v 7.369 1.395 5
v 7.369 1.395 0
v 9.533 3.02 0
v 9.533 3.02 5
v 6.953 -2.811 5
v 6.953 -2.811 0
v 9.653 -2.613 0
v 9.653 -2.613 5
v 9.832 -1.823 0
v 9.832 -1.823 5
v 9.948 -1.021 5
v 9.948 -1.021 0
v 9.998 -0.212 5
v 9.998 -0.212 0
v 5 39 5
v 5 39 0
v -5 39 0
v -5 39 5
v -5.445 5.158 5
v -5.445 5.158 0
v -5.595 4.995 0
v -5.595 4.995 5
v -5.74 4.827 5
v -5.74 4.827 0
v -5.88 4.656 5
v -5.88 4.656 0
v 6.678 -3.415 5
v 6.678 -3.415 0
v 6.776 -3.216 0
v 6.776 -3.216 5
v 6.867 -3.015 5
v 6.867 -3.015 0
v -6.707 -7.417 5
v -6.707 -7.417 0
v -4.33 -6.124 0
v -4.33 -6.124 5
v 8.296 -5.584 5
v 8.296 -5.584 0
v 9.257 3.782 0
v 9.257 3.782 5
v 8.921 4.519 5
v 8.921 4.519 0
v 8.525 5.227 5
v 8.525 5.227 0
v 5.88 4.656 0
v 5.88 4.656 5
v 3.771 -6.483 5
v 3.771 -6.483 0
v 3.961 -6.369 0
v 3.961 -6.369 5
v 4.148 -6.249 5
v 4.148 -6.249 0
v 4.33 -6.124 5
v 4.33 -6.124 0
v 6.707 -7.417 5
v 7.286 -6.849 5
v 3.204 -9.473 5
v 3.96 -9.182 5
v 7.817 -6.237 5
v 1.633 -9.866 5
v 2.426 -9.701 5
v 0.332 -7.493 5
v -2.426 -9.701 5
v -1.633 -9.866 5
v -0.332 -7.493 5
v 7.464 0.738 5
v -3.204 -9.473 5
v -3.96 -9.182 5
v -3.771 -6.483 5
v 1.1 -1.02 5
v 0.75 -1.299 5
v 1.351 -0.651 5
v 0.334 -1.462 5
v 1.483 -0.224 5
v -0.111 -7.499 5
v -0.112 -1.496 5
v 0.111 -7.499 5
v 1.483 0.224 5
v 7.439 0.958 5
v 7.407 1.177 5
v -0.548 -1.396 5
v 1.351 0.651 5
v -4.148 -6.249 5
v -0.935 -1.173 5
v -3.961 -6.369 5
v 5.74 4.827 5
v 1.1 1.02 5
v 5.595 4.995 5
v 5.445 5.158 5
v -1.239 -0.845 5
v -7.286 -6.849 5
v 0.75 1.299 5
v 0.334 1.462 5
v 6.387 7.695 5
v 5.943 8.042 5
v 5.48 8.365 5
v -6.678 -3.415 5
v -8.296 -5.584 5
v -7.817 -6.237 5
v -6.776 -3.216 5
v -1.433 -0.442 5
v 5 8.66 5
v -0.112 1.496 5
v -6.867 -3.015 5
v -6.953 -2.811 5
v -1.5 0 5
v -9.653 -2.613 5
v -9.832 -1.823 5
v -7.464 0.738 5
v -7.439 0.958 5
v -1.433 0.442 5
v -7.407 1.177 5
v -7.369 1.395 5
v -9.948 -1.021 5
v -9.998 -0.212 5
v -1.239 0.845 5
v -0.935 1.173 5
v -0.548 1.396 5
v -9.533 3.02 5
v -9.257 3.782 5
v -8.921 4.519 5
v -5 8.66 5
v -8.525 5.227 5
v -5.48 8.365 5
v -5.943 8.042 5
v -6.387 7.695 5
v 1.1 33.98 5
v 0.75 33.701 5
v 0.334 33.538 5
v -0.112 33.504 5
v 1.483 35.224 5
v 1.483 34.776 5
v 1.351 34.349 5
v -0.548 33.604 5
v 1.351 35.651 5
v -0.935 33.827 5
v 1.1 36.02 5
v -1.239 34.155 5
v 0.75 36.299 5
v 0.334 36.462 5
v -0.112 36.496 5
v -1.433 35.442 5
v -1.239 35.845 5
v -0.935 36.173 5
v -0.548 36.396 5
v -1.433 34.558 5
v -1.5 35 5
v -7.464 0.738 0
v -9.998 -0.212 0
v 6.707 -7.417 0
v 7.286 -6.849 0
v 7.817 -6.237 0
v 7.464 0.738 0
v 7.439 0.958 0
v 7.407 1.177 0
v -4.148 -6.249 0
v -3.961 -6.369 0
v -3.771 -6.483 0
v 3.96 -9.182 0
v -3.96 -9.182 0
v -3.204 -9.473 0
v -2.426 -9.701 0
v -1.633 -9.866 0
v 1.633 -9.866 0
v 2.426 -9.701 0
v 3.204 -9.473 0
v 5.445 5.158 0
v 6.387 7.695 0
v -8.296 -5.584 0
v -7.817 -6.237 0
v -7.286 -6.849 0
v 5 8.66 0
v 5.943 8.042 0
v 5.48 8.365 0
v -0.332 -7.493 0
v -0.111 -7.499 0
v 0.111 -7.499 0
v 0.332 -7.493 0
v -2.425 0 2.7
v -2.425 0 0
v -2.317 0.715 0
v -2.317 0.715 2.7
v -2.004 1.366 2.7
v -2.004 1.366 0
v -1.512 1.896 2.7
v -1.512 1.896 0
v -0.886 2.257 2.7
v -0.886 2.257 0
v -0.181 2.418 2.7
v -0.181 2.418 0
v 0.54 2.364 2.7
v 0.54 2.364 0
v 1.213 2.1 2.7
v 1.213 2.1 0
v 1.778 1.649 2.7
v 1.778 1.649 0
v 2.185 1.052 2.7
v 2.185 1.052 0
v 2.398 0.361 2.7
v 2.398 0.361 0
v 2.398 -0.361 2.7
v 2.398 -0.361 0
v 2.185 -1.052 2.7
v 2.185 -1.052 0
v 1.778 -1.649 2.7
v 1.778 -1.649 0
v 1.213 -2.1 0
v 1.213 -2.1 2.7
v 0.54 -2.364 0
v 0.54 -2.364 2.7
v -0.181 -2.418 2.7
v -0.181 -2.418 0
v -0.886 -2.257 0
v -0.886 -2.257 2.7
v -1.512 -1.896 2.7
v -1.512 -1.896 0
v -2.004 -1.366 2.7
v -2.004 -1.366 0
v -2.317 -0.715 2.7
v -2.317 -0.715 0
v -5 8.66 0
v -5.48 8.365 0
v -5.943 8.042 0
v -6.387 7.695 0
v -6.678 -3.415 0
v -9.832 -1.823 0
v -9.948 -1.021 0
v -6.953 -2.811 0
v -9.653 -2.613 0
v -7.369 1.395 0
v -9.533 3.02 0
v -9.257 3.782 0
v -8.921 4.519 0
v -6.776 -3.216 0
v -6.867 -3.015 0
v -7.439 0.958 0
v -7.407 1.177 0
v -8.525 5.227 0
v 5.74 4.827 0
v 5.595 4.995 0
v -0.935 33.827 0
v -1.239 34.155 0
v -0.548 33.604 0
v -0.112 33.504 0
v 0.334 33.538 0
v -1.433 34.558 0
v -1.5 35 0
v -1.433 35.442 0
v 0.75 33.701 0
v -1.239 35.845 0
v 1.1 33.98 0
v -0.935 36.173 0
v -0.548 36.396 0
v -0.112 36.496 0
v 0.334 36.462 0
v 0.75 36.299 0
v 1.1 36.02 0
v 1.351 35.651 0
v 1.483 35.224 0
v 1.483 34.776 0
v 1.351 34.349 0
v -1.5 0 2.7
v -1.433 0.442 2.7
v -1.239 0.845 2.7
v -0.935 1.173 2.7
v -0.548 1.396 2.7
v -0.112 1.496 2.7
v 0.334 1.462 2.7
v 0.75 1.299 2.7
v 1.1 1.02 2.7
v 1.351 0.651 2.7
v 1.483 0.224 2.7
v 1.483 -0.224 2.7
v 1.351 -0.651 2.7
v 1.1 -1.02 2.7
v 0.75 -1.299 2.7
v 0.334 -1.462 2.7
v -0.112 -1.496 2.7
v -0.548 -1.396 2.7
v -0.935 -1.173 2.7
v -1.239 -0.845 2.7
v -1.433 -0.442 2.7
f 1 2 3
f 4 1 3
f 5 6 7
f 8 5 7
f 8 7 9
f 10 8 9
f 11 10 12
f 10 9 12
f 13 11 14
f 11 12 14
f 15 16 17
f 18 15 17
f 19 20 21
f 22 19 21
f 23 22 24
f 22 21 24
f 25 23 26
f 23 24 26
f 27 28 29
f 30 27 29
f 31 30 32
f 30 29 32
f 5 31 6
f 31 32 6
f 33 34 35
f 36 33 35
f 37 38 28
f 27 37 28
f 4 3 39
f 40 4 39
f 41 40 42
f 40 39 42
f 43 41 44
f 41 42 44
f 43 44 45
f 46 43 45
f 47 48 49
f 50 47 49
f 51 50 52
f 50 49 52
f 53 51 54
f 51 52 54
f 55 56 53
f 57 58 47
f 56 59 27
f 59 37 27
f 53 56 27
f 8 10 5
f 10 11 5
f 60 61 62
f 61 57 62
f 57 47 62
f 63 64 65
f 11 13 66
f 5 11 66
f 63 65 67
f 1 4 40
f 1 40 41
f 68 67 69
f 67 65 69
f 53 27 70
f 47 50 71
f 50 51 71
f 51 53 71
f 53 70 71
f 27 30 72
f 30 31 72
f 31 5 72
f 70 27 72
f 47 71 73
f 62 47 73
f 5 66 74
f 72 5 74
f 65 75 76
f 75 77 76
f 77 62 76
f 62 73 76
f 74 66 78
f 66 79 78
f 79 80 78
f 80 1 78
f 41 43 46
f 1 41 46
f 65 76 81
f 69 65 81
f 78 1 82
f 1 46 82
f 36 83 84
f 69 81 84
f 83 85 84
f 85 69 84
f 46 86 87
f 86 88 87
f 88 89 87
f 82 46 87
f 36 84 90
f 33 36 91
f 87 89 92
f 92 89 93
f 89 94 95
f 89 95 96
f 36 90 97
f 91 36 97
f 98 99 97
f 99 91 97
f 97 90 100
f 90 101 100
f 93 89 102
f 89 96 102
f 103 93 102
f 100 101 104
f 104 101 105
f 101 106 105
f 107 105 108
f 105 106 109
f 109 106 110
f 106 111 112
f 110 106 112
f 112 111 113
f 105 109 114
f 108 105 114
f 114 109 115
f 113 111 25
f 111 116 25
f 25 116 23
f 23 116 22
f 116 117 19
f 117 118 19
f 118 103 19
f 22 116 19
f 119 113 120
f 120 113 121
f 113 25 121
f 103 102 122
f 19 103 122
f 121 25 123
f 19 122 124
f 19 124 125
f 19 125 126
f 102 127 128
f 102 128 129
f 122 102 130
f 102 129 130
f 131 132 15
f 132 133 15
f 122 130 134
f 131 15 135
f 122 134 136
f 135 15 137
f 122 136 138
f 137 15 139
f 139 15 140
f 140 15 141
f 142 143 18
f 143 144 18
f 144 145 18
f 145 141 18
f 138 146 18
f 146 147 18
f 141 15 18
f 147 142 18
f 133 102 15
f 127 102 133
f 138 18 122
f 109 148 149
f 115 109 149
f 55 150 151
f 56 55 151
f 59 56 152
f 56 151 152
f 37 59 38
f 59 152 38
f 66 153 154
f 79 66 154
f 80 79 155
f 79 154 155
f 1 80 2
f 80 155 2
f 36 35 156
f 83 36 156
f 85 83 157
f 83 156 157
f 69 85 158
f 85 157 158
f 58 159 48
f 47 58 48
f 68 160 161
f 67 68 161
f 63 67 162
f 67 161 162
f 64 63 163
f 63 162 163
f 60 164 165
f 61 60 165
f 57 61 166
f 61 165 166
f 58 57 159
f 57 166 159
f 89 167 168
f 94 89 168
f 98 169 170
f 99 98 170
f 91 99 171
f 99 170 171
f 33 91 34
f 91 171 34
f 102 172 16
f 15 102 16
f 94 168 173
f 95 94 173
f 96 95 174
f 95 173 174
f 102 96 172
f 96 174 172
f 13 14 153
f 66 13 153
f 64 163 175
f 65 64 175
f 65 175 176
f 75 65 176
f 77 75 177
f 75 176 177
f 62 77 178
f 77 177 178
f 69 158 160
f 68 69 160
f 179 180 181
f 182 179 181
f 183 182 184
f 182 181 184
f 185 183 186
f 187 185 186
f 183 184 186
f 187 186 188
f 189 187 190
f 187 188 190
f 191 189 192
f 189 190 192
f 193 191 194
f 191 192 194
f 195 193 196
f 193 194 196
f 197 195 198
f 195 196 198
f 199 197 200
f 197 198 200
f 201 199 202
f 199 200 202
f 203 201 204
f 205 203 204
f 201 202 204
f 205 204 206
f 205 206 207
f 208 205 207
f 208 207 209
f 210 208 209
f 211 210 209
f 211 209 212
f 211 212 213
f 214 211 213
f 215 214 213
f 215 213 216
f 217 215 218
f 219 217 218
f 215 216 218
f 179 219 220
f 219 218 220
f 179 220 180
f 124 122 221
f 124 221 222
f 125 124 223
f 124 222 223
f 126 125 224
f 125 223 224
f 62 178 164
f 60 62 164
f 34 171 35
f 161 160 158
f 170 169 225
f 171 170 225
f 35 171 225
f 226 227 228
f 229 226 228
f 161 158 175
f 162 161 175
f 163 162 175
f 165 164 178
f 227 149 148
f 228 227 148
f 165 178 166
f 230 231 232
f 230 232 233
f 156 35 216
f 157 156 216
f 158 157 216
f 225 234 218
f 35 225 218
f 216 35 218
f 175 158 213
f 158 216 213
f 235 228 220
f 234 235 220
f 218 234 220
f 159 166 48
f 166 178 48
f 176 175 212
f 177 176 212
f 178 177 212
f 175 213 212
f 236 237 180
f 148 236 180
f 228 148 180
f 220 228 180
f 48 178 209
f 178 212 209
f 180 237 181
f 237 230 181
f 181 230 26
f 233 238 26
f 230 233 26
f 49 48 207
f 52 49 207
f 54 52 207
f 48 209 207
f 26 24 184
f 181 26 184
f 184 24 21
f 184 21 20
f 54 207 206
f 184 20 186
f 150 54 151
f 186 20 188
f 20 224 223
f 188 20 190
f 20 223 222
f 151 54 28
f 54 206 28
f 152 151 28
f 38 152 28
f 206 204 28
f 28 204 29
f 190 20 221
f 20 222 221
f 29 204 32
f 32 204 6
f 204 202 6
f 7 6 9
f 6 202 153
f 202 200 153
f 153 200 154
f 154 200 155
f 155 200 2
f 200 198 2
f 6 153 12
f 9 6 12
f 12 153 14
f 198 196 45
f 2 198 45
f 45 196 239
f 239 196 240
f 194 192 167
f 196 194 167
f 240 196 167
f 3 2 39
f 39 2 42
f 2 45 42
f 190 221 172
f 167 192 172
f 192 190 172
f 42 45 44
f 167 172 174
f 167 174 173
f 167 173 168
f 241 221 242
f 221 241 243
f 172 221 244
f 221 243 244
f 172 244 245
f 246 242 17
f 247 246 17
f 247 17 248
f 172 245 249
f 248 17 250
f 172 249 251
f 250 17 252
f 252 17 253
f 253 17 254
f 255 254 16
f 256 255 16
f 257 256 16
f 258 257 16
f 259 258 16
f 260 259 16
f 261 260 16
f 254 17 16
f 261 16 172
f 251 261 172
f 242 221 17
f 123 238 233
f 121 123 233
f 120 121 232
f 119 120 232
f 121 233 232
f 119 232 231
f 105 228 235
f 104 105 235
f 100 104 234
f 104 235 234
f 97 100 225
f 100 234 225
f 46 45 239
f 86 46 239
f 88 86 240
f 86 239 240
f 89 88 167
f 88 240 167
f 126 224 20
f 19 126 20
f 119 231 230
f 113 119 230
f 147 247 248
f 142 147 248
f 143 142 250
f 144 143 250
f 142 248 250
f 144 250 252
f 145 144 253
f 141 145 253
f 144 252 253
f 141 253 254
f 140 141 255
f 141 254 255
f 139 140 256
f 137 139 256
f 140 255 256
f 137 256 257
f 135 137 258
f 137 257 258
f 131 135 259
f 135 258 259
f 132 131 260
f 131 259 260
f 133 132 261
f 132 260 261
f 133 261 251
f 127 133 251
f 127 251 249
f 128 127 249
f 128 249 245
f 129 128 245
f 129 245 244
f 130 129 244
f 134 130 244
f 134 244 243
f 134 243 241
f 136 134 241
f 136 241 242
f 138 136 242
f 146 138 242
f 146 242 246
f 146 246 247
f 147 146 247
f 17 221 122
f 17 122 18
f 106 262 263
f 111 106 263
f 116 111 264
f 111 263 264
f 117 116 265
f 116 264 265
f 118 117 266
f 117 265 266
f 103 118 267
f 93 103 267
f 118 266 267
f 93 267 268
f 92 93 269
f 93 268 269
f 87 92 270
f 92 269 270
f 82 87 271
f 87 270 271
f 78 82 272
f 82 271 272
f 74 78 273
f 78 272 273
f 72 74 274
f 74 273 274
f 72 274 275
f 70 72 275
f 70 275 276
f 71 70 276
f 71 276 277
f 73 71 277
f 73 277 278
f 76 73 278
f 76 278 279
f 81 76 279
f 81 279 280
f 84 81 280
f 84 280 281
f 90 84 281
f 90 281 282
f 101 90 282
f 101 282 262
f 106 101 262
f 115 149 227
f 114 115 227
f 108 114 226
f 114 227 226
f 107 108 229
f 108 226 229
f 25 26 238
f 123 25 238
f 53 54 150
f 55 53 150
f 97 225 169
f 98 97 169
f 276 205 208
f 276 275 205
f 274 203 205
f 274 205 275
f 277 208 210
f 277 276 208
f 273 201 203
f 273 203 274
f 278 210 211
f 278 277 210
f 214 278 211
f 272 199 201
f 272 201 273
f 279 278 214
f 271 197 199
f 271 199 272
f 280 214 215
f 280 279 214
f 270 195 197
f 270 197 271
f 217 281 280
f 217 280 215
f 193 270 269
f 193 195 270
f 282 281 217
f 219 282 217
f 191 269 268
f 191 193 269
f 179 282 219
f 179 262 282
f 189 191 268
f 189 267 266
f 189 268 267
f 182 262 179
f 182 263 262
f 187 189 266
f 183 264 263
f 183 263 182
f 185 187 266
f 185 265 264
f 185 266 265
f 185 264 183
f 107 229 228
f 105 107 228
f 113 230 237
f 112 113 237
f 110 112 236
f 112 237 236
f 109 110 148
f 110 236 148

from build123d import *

# Parameters (mm, degrees)
BOSS_EXTRUDE1_DEPTH = 5
SKETCH5_R           = 2.425
CUT_EXTRUDE2_DEPTH  = 2.7
SKETCH6_R           = 1.5
CUT_EXTRUDE3_DEPTH  = 12
SKETCH7_W           = 10
SKETCH7_H           = 35
BOSS_EXTRUDE3_DEPTH = 5
SKETCH8_R           = 1.5
CUT_EXTRUDE4_DEPTH  = 12


with BuildPart() as part:
    # Sketch1 → Boss-Extrude1 (new body)
    with BuildSketch(Plane.XY):
        with BuildLine():
            Line((-1.212917817, 9.926168967), (-1.792316692, 7.28269187))
            ThreePointArc((-1.792316692, 7.28269187), (-2.112994176, 7.196197302), (-2.429527737, 7.095589826))
            Line((-2.429527737, 7.095589826), (-4.346120706, 9.006177592))
            ThreePointArc((-4.346120706, 9.006177592), (-5.406408175, 8.412535328), (-6.386863504, 7.694671831))
            Line((-6.386863504, 7.694671831), (-5.445113235, 5.157590703))
            ThreePointArc((-5.445113235, 5.157590703), (-5.668121808, 4.911455505), (-5.880014276, 4.655688147))
            Line((-5.880014276, 4.655688147), (-8.525296613, 5.226788465))
            ThreePointArc((-8.525296613, 5.226788465), (-9.096319954, 4.15415013), (-9.533025155, 3.020170756))
            Line((-9.533025155, 3.020170756), (-7.369124799, 1.394990929))
            ThreePointArc((-7.369124799, 1.394990929), (-7.423660814, 1.067361287), (-7.463637828, 0.737638377))
            Line((-7.463637828, 0.737638377), (-9.997751083, -0.212069068))
            ThreePointArc((-9.997751083, -0.212069068), (-9.898214419, -1.423148383), (-9.652518677, -2.613213194))
            Line((-9.652518677, -2.613213194), (-6.953491308, -2.810508608))
            ThreePointArc((-6.953491308, -2.810508608), (-6.822239965, -3.115612598), (-6.677609105, -3.414606366))
            Line((-6.677609105, -3.414606366), (-8.295990224, -5.583596171))
            ThreePointArc((-8.295990224, -5.583596171), (-7.557495744, -6.548607339), (-6.70740572, -7.416920419))
            Line((-6.70740572, -7.416920419), (-4.330173457, -6.12369152))
            ThreePointArc((-4.330173457, -6.12369152), (-4.054806131, -6.309401496), (-3.771486674, -6.482737714))
            Line((-3.771486674, -6.482737714), (-3.960311086, -9.182370941))
            ThreePointArc((-3.960311086, -9.182370941), (-2.817325568, -9.594929736), (-1.63273884, -9.865807817))
            Line((-1.63273884, -9.865807817), (-0.332056129, -7.492645643))
            ThreePointArc((-0.332056129, -7.492645643), (0, -7.5), (0.332056129, -7.492645643))
            Line((0.332056129, -7.492645643), (1.63273884, -9.865807817))
            ThreePointArc((1.63273884, -9.865807817), (2.817325568, -9.594929736), (3.960311086, -9.182370941))
            Line((3.960311086, -9.182370941), (3.771486674, -6.482737714))
            ThreePointArc((3.771486674, -6.482737714), (4.054806131, -6.309401496), (4.330173457, -6.12369152))
            Line((4.330173457, -6.12369152), (6.70740572, -7.416920419))
            ThreePointArc((6.70740572, -7.416920419), (7.557495744, -6.548607339), (8.295990224, -5.583596171))
            Line((8.295990224, -5.583596171), (6.677609105, -3.414606366))
            ThreePointArc((6.677609105, -3.414606366), (6.822239965, -3.115612598), (6.953491308, -2.810508608))
            Line((6.953491308, -2.810508608), (9.652518677, -2.613213194))
            ThreePointArc((9.652518677, -2.613213194), (9.898214419, -1.423148383), (9.997751083, -0.212069068))
            Line((9.997751083, -0.212069068), (7.463637828, 0.737638377))
            ThreePointArc((7.463637828, 0.737638377), (7.423660814, 1.067361287), (7.369124799, 1.394990929))
            Line((7.369124799, 1.394990929), (9.533025155, 3.020170756))
            ThreePointArc((9.533025155, 3.020170756), (9.096319954, 4.15415013), (8.525296613, 5.226788465))
            Line((8.525296613, 5.226788465), (5.880014276, 4.655688147))
            ThreePointArc((5.880014276, 4.655688147), (5.668121808, 4.911455505), (5.445113235, 5.157590703))
            Line((5.445113235, 5.157590703), (6.386863504, 7.694671831))
            ThreePointArc((6.386863504, 7.694671831), (5.406408175, 8.412535328), (4.346120706, 9.006177592))
            Line((4.346120706, 9.006177592), (2.429527737, 7.095589826))
            ThreePointArc((2.429527737, 7.095589826), (2.112994176, 7.196197302), (1.792316692, 7.28269187))
            Line((1.792316692, 7.28269187), (1.212917817, 9.926168967))
            ThreePointArc((1.212917817, 9.926168967), (0, 10), (-1.212917817, 9.926168967))
        make_face()
    extrude(amount=BOSS_EXTRUDE1_DEPTH)

    # Sketch5 → Cut-Extrude2 (cut)
    with BuildSketch(Plane(origin=(0, 0, 0), x_dir=(-1, 0, 0), z_dir=(0, 0, -1))):
        Circle(SKETCH5_R)
    extrude(amount=-CUT_EXTRUDE2_DEPTH, mode=Mode.SUBTRACT)

    # Sketch6 → Cut-Extrude3 (cut)
    with BuildSketch(Plane(origin=(0, 0, 2.7), x_dir=(-1, 0, 0), z_dir=(0, 0, -1))):
        Circle(SKETCH6_R)
    extrude(amount=-CUT_EXTRUDE3_DEPTH, mode=Mode.SUBTRACT)

    # Sketch7 → Boss-Extrude3 (add)
    with BuildSketch(Plane(origin=(0, 0, 0), x_dir=(-1, 0, 0), z_dir=(0, 0, -1))):
        with Locations((0, 21.5)):
            Rectangle(SKETCH7_W, SKETCH7_H)
    extrude(amount=-BOSS_EXTRUDE3_DEPTH)

    # Sketch8 → Cut-Extrude4 (cut)
    with BuildSketch(Plane(origin=(0, 0, 0), x_dir=(-1, 0, 0), z_dir=(0, 0, -1))):
        with Locations((0, 35)):
            Circle(SKETCH8_R)
    extrude(amount=-CUT_EXTRUDE4_DEPTH, mode=Mode.SUBTRACT)


solid = part.part
